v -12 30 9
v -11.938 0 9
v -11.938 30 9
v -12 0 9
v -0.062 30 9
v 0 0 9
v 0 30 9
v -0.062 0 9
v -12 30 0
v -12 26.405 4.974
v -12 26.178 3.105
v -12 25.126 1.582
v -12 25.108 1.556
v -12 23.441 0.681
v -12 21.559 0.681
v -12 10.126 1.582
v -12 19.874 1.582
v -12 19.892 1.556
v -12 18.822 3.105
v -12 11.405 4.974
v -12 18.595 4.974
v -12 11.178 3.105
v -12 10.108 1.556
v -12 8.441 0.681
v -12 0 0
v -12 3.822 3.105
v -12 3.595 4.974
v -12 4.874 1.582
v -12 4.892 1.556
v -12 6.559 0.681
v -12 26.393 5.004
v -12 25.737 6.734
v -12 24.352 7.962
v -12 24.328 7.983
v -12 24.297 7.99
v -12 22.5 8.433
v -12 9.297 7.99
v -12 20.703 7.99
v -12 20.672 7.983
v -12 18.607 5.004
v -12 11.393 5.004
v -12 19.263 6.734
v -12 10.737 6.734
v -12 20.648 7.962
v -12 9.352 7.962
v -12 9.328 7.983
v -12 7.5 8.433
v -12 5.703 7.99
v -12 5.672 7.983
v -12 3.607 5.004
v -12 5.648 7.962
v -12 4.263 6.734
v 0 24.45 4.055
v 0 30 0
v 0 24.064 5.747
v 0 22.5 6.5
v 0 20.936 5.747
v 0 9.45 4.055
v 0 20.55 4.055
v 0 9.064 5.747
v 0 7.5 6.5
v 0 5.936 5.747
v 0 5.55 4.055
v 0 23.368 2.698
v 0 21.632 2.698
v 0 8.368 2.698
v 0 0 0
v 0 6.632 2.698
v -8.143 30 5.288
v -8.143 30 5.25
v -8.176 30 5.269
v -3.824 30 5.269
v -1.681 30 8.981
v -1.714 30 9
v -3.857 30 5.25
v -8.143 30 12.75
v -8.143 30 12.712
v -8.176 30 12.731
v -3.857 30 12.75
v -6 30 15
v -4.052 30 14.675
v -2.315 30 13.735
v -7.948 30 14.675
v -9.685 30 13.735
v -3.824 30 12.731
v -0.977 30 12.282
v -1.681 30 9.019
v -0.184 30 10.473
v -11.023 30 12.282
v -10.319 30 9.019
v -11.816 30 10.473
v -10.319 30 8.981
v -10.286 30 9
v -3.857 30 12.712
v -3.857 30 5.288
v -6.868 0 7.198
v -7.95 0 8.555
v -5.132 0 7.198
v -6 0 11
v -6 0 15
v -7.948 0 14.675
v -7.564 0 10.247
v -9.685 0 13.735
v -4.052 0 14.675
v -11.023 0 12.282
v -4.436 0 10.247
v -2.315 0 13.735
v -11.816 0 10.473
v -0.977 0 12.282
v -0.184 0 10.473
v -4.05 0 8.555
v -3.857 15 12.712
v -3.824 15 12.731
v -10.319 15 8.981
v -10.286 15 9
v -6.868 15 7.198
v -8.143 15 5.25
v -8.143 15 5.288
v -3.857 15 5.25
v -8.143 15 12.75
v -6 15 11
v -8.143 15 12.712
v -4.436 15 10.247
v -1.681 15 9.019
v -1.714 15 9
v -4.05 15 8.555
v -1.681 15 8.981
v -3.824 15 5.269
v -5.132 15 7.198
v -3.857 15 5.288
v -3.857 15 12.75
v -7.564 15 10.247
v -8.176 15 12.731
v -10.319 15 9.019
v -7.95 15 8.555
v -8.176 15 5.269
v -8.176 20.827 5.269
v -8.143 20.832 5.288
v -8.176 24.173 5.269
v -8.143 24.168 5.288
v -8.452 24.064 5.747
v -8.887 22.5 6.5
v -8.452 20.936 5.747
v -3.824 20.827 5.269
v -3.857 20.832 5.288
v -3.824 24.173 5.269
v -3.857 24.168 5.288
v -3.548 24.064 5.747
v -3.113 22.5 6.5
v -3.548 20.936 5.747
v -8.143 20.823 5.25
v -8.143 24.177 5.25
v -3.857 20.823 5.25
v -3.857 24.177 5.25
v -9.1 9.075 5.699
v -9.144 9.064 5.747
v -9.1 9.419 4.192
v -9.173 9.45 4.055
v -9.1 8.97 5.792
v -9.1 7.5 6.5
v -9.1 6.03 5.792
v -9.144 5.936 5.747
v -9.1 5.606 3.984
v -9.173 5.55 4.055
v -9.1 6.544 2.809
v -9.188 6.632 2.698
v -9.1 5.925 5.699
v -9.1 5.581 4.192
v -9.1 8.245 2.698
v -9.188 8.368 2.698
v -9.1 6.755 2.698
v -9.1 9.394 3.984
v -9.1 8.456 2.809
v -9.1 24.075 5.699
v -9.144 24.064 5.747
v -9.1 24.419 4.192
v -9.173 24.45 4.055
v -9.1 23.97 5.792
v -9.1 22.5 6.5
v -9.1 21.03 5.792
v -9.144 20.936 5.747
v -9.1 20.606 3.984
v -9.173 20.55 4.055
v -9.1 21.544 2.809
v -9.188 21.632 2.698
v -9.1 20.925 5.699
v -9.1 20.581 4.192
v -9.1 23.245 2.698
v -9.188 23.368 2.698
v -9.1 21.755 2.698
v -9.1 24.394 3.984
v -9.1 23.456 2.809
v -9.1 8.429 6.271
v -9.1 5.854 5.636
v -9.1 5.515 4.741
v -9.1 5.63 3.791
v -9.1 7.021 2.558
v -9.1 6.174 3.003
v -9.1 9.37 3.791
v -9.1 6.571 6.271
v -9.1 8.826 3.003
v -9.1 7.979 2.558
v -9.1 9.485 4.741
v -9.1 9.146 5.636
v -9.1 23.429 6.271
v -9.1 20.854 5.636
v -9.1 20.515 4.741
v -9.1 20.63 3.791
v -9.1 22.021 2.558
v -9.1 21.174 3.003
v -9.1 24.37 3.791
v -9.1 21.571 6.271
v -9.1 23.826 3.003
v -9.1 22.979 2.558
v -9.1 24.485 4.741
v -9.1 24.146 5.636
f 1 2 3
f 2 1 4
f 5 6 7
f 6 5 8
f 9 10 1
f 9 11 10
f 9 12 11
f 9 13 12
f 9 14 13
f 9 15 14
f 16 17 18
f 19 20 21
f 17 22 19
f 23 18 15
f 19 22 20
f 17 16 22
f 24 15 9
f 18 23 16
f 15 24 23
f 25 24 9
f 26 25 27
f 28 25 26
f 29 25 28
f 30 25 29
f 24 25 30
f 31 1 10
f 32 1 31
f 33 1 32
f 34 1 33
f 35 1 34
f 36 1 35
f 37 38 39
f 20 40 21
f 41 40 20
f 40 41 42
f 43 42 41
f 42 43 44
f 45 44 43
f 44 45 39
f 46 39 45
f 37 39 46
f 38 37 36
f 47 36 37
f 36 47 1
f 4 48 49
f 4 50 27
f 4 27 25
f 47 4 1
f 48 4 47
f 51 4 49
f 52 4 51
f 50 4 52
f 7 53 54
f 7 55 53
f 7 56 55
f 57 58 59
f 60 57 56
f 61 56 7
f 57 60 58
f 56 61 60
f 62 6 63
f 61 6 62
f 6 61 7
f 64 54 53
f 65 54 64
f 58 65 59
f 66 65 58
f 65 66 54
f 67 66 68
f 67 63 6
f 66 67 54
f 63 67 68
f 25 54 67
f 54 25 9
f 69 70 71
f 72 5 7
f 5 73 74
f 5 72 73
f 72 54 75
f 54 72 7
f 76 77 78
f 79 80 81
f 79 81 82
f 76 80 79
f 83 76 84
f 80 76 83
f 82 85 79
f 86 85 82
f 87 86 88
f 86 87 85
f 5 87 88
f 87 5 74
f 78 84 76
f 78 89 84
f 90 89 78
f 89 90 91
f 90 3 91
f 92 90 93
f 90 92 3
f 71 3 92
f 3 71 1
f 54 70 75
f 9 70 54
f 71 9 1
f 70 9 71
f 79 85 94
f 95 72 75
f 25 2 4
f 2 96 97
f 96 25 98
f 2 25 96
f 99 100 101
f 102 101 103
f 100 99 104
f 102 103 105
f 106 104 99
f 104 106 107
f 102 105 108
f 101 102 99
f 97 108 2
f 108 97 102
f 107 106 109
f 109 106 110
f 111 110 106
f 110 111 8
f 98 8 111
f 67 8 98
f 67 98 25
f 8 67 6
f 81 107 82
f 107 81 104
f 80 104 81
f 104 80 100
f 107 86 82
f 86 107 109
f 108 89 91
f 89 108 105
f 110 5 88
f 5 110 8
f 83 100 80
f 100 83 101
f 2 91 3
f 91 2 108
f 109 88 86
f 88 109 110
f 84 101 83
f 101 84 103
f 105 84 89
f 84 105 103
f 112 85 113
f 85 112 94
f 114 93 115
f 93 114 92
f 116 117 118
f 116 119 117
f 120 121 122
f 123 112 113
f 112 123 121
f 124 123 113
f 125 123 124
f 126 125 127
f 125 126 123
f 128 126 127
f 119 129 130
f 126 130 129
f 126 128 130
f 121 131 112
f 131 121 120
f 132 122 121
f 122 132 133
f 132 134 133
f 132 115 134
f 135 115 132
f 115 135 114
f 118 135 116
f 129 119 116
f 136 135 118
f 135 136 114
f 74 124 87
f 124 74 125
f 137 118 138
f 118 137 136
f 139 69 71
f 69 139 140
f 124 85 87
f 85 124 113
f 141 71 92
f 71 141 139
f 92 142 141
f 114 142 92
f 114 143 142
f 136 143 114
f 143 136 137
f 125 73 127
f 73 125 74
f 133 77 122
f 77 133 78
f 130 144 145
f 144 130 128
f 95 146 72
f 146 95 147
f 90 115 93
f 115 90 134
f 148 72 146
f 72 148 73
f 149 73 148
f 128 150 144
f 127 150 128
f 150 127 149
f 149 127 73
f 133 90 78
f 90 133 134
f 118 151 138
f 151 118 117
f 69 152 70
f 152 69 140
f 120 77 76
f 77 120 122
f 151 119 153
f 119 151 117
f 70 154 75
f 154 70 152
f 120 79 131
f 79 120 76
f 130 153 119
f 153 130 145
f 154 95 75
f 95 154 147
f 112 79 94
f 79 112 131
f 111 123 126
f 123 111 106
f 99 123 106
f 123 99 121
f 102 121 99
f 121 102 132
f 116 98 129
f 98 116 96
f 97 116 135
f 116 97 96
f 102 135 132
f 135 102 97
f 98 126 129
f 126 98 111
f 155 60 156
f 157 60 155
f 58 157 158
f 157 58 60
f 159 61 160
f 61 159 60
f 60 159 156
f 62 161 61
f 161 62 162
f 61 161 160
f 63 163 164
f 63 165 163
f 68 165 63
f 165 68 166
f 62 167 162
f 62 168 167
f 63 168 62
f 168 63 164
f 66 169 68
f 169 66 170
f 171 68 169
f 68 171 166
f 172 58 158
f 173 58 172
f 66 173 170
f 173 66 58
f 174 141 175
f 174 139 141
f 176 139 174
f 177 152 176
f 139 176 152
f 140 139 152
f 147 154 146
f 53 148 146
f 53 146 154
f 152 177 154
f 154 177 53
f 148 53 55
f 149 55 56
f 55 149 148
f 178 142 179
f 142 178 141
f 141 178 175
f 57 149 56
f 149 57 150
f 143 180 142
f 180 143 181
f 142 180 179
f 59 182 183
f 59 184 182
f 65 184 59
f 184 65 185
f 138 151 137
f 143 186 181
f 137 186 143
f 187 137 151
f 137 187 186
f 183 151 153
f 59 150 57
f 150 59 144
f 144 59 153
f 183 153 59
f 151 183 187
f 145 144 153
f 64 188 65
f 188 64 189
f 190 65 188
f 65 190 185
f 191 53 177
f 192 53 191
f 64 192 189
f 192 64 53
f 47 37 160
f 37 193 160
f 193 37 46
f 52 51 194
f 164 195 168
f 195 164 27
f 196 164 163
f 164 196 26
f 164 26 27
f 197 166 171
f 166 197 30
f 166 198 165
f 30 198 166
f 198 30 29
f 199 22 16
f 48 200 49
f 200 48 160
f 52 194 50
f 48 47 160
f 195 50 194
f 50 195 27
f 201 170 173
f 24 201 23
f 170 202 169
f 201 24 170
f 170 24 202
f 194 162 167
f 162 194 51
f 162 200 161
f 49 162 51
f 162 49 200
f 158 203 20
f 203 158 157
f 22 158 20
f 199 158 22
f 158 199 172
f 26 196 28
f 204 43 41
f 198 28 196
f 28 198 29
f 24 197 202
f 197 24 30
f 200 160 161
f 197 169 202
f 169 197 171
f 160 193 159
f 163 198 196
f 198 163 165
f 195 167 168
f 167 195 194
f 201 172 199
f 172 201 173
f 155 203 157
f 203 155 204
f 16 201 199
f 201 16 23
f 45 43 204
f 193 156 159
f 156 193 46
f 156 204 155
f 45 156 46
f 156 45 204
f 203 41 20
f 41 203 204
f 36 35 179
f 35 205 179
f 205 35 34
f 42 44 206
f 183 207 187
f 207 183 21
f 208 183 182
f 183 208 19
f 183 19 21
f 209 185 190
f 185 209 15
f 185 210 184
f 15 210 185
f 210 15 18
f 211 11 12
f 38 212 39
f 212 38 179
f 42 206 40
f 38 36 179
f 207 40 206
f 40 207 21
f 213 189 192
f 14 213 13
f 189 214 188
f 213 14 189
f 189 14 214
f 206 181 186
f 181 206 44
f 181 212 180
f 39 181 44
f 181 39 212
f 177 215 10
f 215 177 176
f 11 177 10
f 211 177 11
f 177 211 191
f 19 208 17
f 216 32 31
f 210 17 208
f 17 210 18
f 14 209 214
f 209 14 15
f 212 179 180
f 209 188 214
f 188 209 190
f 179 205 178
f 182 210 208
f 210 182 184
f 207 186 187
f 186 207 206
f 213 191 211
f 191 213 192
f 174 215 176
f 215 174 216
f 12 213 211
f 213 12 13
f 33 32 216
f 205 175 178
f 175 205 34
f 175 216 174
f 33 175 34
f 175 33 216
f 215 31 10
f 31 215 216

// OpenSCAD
wood_thickness = 9;  // base for sizes is the wood thickness

hinge_depth = 30;  // actually the length of the body
hinge_height = wood_thickness * 1.0;  // * 1.0 for just folding or * 1.5 for folding over 
hinge_width = 12;  // thickness
penis_dia = 7;
penis_length = 5;
penis_clearance = 0.4;  // Try this out, see if it fits. 

hole_from_side = hinge_depth / 4;
hole_from_bottom = wood_thickness / 2;
hole_dia = 4;
hole_dia_outer = 8;
hole_distance_to_outer = 3;  // distance from outer to narrow part

left_or_right = 0;  // 0 for tapped hole on one side, 1 for other side
single = 1;

pin_hexagon_size = 7.5;  // moerkop grootte
pin_head_length = hinge_depth; //hinge_depth / 3;  // Ruimte voor moerkop  
pin_length = hinge_depth / 2;  // Hoe lang is de pin in het plastic
pin_dia = 4;

// size is the XY plane size, height in Z
module hexagon(size, height) {
  boxWidth = size/1.75;
  for (r = [-60, 0, 60]) rotate([0,0,r]) cube([boxWidth, size, height], true);
}


module hinge_body() {
	cube([hinge_height, hinge_depth, hinge_width]);

	translate([hinge_height, 0, hinge_width/2])
	rotate(a=-90, v=[1,0,0])
	cylinder(hinge_depth, hinge_width/2, hinge_width/2, [0,0,0]);
}


module hinge() {
rotate([0, -90, 0]) 
difference() {
	hinge_body();

	// Pin head
	translate([hinge_height, pin_head_length/2 + pin_length, hinge_width/2])
	rotate(a=-90, v=[1,0,0])
	rotate(a=30, v=[0,0,1])
	hexagon(pin_hexagon_size, pin_head_length);

	// Open up
	//translate([hinge_height,pin_length,-1])
	//cube([hinge_height+2, hinge_depth, hinge_width+2]);

	// The actual pin
	translate([hinge_height, -1, hinge_width/2])
	rotate([-90,0,0])
	cylinder(r=pin_dia/2, h=pin_length+2);

	// Screw holes
	translate([hole_from_bottom, hole_from_side, -1])
	cylinder(r=hole_dia/2, h=hinge_depth+2);

	translate([hole_from_bottom, hinge_depth - hole_from_side, -1])
	cylinder(r=hole_dia/2, h=hinge_depth+2);

	// Make screw holes tapped
	translate([hole_from_bottom, hole_from_side, hinge_width-hole_distance_to_outer+0.1])
	cylinder(hole_distance_to_outer, hole_dia/2, hole_dia_outer/2);
	translate([hole_from_bottom, hinge_depth - hole_from_side, hinge_width-hole_distance_to_outer+0.1])
	cylinder(hole_distance_to_outer, hole_dia/2, hole_dia_outer/2);
}
}

if (left_or_right == 0) {
  hinge();

if (single == 0) {
translate([2*hinge_width,0,0])
  hinge();
}

} else {

translate([-hinge_width,0,0])
mirror([ 1, 0, 0 ]) {hinge(); }

if (single == 0) {
translate([hinge_width,0,0])
mirror([ 1, 0, 0 ]) {hinge(); }
}

}
